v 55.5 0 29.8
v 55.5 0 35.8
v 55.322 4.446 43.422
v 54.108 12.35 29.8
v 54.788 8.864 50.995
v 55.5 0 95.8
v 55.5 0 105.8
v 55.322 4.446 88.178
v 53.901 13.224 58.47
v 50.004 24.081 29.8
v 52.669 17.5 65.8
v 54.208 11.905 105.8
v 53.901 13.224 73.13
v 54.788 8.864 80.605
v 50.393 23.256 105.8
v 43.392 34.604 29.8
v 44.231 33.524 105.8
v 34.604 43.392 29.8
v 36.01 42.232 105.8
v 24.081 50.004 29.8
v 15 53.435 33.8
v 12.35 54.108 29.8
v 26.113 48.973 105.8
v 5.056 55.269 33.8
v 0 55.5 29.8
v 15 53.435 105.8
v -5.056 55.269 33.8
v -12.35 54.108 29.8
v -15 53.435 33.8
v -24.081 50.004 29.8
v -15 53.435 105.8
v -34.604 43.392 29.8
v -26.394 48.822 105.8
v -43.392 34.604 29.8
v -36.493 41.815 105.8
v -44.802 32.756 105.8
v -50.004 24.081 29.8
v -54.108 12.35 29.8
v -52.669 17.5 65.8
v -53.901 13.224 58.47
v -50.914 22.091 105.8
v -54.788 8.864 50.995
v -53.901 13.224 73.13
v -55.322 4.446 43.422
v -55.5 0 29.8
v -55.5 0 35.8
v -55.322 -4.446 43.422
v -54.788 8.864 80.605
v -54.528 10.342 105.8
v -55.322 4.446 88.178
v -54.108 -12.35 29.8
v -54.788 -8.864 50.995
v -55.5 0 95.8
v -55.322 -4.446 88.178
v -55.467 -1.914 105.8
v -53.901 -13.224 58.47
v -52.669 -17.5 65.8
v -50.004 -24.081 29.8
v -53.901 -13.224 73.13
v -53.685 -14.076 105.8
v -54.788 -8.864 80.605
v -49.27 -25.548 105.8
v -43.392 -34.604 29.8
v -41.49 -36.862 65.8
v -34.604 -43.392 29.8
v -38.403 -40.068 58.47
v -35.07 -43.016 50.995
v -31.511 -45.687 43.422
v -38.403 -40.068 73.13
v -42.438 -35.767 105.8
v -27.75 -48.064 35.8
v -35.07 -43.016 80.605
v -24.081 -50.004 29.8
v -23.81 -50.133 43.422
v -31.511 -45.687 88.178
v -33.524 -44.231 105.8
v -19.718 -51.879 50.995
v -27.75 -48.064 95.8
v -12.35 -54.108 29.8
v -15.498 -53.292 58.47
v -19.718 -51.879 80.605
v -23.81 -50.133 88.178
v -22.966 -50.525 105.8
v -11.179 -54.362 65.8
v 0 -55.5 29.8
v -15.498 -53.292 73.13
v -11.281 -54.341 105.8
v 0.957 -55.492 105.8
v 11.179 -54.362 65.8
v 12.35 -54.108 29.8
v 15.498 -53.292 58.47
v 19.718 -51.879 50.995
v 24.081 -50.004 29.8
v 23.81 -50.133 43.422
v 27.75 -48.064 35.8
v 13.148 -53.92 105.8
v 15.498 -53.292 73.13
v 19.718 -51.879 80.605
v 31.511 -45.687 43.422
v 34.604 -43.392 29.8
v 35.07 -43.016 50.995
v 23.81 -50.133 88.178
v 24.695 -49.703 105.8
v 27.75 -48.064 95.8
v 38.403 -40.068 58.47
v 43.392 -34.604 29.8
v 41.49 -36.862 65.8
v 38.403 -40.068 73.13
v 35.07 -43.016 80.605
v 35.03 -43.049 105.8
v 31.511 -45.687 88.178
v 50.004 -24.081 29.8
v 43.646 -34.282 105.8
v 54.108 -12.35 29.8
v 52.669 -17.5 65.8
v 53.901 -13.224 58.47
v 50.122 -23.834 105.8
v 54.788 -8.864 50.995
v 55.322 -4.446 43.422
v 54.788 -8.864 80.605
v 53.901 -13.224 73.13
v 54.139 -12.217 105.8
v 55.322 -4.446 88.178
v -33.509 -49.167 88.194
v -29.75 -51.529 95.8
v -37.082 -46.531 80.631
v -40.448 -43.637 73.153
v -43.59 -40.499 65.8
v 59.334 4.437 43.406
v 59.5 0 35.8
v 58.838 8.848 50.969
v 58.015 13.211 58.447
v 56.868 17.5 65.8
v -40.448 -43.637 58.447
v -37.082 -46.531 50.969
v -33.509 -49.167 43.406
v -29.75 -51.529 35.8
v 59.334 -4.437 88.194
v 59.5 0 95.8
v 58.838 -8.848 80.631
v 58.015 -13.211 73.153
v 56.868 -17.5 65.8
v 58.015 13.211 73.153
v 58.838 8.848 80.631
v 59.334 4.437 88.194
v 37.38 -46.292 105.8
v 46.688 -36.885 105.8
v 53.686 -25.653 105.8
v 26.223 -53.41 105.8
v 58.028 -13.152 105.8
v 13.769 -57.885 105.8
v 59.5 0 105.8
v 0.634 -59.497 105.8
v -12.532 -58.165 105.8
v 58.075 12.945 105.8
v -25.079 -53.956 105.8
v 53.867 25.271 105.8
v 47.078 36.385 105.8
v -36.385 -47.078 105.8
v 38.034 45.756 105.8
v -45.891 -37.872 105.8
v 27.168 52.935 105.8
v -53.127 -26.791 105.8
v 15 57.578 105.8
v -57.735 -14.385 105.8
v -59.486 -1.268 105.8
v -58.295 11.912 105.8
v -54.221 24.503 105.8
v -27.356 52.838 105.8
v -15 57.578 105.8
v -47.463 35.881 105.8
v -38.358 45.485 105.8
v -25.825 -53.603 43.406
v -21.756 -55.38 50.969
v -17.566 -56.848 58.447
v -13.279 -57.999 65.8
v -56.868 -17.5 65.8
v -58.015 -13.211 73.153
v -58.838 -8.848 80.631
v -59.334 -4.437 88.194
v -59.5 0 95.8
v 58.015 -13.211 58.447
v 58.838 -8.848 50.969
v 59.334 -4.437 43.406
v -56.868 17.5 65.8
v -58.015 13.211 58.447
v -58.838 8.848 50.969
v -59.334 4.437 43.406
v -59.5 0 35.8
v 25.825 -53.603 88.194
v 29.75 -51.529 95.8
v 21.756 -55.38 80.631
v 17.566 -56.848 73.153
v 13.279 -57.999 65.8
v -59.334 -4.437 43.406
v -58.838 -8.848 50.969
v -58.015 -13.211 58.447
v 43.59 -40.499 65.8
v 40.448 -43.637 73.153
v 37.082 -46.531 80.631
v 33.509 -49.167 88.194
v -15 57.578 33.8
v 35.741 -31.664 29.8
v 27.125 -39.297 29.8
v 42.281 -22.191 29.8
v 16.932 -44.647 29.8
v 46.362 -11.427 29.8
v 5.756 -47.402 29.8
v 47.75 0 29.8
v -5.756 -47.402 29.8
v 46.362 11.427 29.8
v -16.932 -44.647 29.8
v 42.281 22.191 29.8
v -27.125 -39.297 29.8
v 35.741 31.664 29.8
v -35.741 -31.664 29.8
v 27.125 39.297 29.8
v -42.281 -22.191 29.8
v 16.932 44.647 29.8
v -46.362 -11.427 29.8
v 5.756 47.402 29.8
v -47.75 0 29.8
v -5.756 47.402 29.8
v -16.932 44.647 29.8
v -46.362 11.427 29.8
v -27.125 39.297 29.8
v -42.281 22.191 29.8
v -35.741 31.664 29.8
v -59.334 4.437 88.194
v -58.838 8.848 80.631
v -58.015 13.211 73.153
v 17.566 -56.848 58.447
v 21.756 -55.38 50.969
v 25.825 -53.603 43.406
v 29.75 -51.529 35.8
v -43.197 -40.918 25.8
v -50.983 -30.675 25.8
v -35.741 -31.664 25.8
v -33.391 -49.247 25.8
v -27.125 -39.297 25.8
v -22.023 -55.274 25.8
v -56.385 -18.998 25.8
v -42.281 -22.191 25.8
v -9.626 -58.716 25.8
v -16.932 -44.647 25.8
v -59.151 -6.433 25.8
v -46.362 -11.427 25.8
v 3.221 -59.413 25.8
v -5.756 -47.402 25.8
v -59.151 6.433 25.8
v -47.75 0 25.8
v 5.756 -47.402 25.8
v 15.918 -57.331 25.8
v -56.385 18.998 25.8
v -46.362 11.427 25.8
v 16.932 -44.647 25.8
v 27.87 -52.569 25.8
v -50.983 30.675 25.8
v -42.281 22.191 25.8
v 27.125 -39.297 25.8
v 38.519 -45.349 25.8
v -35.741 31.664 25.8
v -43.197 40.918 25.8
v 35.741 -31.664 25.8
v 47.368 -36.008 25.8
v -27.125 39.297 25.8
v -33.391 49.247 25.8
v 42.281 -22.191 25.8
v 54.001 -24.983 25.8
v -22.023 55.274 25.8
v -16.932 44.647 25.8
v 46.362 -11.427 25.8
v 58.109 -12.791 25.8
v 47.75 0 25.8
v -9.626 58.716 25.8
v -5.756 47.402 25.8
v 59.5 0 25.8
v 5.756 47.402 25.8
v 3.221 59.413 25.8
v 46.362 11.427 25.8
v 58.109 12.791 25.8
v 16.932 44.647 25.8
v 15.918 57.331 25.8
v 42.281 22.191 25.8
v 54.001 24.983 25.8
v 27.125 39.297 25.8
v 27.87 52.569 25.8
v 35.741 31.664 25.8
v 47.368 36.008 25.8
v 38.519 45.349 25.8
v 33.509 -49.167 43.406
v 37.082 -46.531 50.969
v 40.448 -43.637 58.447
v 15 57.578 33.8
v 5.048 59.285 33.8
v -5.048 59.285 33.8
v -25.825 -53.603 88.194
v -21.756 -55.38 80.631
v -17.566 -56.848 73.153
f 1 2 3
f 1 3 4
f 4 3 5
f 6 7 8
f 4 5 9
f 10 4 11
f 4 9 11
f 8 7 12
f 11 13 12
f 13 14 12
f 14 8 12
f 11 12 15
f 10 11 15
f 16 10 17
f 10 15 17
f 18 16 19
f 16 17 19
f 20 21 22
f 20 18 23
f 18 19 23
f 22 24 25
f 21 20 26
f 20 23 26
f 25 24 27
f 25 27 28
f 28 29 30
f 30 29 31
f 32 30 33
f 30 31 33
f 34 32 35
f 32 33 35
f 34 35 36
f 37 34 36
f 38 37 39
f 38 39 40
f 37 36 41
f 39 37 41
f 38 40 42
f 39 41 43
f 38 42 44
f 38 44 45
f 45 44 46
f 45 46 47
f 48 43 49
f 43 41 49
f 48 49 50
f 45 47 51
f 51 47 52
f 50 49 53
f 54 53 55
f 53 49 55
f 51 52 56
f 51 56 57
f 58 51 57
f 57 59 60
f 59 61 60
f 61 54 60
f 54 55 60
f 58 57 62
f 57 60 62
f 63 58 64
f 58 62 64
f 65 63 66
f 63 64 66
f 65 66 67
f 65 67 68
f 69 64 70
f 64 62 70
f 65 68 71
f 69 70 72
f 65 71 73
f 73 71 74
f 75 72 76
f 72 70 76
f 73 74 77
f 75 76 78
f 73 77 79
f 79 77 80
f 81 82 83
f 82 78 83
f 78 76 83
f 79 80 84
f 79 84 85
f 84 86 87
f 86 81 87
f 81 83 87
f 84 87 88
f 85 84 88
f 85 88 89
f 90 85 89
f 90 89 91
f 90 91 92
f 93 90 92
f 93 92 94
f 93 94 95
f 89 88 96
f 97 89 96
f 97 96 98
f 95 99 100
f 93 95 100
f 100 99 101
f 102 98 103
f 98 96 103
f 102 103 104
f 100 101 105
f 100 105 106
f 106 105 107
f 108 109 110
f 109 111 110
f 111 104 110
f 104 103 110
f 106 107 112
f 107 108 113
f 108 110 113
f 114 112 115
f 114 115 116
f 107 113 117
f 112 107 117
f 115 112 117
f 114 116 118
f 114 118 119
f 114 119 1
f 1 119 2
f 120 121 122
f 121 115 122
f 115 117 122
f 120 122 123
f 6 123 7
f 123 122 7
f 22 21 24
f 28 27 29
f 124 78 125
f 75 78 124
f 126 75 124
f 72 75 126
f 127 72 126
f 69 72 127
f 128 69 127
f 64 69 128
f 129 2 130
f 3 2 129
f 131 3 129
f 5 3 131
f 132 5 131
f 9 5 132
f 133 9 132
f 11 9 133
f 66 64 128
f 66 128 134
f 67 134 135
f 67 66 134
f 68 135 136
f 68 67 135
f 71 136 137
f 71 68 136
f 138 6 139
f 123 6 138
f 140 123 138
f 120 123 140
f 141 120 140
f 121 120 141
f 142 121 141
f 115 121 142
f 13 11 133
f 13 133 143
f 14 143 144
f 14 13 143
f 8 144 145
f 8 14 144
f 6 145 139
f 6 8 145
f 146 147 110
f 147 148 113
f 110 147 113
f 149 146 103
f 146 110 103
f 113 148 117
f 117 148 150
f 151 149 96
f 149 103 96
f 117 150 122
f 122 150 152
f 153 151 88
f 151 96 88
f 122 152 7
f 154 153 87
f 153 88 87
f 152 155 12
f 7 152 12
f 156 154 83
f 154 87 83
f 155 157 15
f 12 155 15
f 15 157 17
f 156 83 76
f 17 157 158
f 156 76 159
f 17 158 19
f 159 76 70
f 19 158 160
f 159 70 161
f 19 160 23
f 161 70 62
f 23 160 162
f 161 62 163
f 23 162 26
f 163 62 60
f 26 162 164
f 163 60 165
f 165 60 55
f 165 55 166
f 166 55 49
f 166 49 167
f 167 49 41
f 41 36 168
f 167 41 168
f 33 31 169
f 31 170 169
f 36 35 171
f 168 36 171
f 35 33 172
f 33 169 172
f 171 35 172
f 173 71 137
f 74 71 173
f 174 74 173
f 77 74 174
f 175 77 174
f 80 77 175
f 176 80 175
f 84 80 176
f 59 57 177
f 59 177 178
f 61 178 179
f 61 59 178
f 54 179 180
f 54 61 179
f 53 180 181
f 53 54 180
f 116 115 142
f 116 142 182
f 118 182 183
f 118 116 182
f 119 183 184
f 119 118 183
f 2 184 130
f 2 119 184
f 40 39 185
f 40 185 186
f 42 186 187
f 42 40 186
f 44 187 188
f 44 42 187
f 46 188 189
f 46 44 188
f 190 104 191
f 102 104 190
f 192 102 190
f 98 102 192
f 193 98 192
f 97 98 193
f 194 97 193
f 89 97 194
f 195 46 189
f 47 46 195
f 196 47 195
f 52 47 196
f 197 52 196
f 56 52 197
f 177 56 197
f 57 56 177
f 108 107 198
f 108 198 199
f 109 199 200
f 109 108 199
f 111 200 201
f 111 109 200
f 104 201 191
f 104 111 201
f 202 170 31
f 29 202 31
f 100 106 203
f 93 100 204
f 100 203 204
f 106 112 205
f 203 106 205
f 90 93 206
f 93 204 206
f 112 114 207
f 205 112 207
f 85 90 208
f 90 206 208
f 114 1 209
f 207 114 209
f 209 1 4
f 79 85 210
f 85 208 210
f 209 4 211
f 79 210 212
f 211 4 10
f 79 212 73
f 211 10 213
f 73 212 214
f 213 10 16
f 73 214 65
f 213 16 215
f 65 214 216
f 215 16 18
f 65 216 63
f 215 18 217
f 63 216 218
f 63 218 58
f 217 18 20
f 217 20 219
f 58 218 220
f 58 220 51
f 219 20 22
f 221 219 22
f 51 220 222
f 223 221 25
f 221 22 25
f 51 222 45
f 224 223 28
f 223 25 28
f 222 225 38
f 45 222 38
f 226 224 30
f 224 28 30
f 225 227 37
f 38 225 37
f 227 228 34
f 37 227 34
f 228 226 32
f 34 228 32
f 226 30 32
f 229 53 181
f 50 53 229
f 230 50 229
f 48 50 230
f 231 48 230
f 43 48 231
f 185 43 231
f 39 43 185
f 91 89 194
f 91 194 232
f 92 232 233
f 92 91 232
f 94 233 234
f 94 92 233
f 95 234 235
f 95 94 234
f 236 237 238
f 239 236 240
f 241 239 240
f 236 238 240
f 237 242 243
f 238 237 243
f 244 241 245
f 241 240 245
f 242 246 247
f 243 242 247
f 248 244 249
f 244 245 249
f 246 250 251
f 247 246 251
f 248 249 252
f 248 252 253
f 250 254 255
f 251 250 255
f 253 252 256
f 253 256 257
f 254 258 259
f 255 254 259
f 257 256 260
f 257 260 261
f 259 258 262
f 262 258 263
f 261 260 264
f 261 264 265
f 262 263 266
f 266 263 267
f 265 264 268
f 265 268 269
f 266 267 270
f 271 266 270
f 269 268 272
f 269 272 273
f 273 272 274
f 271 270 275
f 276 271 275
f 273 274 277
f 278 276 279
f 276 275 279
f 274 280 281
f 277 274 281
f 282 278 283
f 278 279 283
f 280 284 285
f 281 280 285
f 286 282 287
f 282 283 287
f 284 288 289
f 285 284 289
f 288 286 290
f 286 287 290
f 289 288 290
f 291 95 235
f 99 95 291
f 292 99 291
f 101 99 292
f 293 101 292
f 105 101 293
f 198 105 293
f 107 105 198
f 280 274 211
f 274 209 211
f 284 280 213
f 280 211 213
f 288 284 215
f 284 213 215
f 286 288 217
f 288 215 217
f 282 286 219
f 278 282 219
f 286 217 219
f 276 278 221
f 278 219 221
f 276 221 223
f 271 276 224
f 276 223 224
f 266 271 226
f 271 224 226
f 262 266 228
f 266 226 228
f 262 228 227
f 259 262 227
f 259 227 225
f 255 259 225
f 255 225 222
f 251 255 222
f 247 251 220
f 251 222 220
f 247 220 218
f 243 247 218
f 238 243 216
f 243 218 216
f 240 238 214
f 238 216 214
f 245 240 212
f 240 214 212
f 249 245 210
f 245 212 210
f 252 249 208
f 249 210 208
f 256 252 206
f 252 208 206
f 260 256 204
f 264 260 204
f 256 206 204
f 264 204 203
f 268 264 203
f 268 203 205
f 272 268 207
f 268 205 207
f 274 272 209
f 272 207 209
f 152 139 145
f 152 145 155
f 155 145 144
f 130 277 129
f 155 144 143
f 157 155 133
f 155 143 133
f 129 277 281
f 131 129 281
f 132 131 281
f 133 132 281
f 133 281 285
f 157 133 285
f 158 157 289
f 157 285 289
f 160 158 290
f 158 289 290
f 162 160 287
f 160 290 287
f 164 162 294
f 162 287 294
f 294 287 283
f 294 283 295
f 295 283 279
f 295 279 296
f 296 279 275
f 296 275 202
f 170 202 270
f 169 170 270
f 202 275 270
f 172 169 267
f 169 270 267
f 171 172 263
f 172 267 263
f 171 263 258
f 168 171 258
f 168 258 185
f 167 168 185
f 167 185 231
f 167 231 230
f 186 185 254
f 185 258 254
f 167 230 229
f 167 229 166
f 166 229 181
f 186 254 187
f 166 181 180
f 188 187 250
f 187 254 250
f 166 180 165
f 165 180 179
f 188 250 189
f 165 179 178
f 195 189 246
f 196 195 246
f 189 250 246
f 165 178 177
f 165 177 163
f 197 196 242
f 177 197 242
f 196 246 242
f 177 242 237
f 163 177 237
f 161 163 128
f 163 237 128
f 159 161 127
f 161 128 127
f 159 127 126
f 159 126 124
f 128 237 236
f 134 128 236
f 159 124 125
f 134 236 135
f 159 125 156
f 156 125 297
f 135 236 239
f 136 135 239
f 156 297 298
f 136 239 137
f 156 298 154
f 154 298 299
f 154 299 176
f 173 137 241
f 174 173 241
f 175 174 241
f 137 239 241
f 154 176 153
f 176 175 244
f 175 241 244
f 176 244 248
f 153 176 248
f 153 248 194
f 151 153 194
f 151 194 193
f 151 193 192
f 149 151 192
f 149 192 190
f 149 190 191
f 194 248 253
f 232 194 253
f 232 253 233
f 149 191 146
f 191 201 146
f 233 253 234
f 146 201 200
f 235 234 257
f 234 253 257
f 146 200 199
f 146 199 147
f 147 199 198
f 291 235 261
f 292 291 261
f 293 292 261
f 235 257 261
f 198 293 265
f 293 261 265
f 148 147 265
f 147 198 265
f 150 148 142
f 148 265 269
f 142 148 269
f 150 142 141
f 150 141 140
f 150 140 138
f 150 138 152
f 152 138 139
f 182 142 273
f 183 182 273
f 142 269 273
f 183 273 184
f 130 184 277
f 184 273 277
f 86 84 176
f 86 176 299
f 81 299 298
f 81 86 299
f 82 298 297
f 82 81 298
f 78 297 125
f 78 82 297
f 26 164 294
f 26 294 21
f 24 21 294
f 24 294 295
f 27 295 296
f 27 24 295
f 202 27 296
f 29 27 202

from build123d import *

# Parameters (mm, degrees)
POCKET_DEPTH       = 432.177804
POLARPATTERN_COUNT = 4
POLARPATTERN_ANGLE = 180
SKETCH006_W        = 30
SKETCH006_H        = 75
POCKET001_DEPTH    = 72


with BuildPart() as part:
    # Sketch → Revolution001 (revolve)
    with BuildSketch(Plane.XZ):
        Polygon((47.75, 29.8), (55.5, 29.8), (55.5, 105.8), (59.5, 105.8), (59.5, 25.8), (47.75, 25.8), align=None)
    revolve(axis=Axis((0, 0, 0), (0, 0, 1)))

    # Sketch005 → Pocket (cut, through all)
    with BuildSketch(Plane.YZ):
        Polygon((0, 35.8), (-17.5, 65.8), (0, 95.8), (17.5, 65.8), align=None)
    pocket = extrude(amount=-POCKET_DEPTH, mode=Mode.SUBTRACT)

    # PolarPattern: Pocket ×4 about axis
    polarpattern_axis = Axis((0, 0, 0), (0, 0, 1))
    for i in range(1, POLARPATTERN_COUNT):
        add(pocket.rotate(polarpattern_axis, i * POLARPATTERN_ANGLE / (POLARPATTERN_COUNT - 1)), mode=Mode.SUBTRACT)

    # Sketch006 (on Face7 of PolarPattern) → Pocket001 (cut)
    with BuildSketch(Plane(origin=(0, 0, 105.8), x_dir=(-1, 0, 0), z_dir=(0, 0, 1))):
        with Locations((0, -37.5)):
            Rectangle(SKETCH006_W, SKETCH006_H)
    extrude(amount=-POCKET001_DEPTH, mode=Mode.SUBTRACT)


solid = part.part
